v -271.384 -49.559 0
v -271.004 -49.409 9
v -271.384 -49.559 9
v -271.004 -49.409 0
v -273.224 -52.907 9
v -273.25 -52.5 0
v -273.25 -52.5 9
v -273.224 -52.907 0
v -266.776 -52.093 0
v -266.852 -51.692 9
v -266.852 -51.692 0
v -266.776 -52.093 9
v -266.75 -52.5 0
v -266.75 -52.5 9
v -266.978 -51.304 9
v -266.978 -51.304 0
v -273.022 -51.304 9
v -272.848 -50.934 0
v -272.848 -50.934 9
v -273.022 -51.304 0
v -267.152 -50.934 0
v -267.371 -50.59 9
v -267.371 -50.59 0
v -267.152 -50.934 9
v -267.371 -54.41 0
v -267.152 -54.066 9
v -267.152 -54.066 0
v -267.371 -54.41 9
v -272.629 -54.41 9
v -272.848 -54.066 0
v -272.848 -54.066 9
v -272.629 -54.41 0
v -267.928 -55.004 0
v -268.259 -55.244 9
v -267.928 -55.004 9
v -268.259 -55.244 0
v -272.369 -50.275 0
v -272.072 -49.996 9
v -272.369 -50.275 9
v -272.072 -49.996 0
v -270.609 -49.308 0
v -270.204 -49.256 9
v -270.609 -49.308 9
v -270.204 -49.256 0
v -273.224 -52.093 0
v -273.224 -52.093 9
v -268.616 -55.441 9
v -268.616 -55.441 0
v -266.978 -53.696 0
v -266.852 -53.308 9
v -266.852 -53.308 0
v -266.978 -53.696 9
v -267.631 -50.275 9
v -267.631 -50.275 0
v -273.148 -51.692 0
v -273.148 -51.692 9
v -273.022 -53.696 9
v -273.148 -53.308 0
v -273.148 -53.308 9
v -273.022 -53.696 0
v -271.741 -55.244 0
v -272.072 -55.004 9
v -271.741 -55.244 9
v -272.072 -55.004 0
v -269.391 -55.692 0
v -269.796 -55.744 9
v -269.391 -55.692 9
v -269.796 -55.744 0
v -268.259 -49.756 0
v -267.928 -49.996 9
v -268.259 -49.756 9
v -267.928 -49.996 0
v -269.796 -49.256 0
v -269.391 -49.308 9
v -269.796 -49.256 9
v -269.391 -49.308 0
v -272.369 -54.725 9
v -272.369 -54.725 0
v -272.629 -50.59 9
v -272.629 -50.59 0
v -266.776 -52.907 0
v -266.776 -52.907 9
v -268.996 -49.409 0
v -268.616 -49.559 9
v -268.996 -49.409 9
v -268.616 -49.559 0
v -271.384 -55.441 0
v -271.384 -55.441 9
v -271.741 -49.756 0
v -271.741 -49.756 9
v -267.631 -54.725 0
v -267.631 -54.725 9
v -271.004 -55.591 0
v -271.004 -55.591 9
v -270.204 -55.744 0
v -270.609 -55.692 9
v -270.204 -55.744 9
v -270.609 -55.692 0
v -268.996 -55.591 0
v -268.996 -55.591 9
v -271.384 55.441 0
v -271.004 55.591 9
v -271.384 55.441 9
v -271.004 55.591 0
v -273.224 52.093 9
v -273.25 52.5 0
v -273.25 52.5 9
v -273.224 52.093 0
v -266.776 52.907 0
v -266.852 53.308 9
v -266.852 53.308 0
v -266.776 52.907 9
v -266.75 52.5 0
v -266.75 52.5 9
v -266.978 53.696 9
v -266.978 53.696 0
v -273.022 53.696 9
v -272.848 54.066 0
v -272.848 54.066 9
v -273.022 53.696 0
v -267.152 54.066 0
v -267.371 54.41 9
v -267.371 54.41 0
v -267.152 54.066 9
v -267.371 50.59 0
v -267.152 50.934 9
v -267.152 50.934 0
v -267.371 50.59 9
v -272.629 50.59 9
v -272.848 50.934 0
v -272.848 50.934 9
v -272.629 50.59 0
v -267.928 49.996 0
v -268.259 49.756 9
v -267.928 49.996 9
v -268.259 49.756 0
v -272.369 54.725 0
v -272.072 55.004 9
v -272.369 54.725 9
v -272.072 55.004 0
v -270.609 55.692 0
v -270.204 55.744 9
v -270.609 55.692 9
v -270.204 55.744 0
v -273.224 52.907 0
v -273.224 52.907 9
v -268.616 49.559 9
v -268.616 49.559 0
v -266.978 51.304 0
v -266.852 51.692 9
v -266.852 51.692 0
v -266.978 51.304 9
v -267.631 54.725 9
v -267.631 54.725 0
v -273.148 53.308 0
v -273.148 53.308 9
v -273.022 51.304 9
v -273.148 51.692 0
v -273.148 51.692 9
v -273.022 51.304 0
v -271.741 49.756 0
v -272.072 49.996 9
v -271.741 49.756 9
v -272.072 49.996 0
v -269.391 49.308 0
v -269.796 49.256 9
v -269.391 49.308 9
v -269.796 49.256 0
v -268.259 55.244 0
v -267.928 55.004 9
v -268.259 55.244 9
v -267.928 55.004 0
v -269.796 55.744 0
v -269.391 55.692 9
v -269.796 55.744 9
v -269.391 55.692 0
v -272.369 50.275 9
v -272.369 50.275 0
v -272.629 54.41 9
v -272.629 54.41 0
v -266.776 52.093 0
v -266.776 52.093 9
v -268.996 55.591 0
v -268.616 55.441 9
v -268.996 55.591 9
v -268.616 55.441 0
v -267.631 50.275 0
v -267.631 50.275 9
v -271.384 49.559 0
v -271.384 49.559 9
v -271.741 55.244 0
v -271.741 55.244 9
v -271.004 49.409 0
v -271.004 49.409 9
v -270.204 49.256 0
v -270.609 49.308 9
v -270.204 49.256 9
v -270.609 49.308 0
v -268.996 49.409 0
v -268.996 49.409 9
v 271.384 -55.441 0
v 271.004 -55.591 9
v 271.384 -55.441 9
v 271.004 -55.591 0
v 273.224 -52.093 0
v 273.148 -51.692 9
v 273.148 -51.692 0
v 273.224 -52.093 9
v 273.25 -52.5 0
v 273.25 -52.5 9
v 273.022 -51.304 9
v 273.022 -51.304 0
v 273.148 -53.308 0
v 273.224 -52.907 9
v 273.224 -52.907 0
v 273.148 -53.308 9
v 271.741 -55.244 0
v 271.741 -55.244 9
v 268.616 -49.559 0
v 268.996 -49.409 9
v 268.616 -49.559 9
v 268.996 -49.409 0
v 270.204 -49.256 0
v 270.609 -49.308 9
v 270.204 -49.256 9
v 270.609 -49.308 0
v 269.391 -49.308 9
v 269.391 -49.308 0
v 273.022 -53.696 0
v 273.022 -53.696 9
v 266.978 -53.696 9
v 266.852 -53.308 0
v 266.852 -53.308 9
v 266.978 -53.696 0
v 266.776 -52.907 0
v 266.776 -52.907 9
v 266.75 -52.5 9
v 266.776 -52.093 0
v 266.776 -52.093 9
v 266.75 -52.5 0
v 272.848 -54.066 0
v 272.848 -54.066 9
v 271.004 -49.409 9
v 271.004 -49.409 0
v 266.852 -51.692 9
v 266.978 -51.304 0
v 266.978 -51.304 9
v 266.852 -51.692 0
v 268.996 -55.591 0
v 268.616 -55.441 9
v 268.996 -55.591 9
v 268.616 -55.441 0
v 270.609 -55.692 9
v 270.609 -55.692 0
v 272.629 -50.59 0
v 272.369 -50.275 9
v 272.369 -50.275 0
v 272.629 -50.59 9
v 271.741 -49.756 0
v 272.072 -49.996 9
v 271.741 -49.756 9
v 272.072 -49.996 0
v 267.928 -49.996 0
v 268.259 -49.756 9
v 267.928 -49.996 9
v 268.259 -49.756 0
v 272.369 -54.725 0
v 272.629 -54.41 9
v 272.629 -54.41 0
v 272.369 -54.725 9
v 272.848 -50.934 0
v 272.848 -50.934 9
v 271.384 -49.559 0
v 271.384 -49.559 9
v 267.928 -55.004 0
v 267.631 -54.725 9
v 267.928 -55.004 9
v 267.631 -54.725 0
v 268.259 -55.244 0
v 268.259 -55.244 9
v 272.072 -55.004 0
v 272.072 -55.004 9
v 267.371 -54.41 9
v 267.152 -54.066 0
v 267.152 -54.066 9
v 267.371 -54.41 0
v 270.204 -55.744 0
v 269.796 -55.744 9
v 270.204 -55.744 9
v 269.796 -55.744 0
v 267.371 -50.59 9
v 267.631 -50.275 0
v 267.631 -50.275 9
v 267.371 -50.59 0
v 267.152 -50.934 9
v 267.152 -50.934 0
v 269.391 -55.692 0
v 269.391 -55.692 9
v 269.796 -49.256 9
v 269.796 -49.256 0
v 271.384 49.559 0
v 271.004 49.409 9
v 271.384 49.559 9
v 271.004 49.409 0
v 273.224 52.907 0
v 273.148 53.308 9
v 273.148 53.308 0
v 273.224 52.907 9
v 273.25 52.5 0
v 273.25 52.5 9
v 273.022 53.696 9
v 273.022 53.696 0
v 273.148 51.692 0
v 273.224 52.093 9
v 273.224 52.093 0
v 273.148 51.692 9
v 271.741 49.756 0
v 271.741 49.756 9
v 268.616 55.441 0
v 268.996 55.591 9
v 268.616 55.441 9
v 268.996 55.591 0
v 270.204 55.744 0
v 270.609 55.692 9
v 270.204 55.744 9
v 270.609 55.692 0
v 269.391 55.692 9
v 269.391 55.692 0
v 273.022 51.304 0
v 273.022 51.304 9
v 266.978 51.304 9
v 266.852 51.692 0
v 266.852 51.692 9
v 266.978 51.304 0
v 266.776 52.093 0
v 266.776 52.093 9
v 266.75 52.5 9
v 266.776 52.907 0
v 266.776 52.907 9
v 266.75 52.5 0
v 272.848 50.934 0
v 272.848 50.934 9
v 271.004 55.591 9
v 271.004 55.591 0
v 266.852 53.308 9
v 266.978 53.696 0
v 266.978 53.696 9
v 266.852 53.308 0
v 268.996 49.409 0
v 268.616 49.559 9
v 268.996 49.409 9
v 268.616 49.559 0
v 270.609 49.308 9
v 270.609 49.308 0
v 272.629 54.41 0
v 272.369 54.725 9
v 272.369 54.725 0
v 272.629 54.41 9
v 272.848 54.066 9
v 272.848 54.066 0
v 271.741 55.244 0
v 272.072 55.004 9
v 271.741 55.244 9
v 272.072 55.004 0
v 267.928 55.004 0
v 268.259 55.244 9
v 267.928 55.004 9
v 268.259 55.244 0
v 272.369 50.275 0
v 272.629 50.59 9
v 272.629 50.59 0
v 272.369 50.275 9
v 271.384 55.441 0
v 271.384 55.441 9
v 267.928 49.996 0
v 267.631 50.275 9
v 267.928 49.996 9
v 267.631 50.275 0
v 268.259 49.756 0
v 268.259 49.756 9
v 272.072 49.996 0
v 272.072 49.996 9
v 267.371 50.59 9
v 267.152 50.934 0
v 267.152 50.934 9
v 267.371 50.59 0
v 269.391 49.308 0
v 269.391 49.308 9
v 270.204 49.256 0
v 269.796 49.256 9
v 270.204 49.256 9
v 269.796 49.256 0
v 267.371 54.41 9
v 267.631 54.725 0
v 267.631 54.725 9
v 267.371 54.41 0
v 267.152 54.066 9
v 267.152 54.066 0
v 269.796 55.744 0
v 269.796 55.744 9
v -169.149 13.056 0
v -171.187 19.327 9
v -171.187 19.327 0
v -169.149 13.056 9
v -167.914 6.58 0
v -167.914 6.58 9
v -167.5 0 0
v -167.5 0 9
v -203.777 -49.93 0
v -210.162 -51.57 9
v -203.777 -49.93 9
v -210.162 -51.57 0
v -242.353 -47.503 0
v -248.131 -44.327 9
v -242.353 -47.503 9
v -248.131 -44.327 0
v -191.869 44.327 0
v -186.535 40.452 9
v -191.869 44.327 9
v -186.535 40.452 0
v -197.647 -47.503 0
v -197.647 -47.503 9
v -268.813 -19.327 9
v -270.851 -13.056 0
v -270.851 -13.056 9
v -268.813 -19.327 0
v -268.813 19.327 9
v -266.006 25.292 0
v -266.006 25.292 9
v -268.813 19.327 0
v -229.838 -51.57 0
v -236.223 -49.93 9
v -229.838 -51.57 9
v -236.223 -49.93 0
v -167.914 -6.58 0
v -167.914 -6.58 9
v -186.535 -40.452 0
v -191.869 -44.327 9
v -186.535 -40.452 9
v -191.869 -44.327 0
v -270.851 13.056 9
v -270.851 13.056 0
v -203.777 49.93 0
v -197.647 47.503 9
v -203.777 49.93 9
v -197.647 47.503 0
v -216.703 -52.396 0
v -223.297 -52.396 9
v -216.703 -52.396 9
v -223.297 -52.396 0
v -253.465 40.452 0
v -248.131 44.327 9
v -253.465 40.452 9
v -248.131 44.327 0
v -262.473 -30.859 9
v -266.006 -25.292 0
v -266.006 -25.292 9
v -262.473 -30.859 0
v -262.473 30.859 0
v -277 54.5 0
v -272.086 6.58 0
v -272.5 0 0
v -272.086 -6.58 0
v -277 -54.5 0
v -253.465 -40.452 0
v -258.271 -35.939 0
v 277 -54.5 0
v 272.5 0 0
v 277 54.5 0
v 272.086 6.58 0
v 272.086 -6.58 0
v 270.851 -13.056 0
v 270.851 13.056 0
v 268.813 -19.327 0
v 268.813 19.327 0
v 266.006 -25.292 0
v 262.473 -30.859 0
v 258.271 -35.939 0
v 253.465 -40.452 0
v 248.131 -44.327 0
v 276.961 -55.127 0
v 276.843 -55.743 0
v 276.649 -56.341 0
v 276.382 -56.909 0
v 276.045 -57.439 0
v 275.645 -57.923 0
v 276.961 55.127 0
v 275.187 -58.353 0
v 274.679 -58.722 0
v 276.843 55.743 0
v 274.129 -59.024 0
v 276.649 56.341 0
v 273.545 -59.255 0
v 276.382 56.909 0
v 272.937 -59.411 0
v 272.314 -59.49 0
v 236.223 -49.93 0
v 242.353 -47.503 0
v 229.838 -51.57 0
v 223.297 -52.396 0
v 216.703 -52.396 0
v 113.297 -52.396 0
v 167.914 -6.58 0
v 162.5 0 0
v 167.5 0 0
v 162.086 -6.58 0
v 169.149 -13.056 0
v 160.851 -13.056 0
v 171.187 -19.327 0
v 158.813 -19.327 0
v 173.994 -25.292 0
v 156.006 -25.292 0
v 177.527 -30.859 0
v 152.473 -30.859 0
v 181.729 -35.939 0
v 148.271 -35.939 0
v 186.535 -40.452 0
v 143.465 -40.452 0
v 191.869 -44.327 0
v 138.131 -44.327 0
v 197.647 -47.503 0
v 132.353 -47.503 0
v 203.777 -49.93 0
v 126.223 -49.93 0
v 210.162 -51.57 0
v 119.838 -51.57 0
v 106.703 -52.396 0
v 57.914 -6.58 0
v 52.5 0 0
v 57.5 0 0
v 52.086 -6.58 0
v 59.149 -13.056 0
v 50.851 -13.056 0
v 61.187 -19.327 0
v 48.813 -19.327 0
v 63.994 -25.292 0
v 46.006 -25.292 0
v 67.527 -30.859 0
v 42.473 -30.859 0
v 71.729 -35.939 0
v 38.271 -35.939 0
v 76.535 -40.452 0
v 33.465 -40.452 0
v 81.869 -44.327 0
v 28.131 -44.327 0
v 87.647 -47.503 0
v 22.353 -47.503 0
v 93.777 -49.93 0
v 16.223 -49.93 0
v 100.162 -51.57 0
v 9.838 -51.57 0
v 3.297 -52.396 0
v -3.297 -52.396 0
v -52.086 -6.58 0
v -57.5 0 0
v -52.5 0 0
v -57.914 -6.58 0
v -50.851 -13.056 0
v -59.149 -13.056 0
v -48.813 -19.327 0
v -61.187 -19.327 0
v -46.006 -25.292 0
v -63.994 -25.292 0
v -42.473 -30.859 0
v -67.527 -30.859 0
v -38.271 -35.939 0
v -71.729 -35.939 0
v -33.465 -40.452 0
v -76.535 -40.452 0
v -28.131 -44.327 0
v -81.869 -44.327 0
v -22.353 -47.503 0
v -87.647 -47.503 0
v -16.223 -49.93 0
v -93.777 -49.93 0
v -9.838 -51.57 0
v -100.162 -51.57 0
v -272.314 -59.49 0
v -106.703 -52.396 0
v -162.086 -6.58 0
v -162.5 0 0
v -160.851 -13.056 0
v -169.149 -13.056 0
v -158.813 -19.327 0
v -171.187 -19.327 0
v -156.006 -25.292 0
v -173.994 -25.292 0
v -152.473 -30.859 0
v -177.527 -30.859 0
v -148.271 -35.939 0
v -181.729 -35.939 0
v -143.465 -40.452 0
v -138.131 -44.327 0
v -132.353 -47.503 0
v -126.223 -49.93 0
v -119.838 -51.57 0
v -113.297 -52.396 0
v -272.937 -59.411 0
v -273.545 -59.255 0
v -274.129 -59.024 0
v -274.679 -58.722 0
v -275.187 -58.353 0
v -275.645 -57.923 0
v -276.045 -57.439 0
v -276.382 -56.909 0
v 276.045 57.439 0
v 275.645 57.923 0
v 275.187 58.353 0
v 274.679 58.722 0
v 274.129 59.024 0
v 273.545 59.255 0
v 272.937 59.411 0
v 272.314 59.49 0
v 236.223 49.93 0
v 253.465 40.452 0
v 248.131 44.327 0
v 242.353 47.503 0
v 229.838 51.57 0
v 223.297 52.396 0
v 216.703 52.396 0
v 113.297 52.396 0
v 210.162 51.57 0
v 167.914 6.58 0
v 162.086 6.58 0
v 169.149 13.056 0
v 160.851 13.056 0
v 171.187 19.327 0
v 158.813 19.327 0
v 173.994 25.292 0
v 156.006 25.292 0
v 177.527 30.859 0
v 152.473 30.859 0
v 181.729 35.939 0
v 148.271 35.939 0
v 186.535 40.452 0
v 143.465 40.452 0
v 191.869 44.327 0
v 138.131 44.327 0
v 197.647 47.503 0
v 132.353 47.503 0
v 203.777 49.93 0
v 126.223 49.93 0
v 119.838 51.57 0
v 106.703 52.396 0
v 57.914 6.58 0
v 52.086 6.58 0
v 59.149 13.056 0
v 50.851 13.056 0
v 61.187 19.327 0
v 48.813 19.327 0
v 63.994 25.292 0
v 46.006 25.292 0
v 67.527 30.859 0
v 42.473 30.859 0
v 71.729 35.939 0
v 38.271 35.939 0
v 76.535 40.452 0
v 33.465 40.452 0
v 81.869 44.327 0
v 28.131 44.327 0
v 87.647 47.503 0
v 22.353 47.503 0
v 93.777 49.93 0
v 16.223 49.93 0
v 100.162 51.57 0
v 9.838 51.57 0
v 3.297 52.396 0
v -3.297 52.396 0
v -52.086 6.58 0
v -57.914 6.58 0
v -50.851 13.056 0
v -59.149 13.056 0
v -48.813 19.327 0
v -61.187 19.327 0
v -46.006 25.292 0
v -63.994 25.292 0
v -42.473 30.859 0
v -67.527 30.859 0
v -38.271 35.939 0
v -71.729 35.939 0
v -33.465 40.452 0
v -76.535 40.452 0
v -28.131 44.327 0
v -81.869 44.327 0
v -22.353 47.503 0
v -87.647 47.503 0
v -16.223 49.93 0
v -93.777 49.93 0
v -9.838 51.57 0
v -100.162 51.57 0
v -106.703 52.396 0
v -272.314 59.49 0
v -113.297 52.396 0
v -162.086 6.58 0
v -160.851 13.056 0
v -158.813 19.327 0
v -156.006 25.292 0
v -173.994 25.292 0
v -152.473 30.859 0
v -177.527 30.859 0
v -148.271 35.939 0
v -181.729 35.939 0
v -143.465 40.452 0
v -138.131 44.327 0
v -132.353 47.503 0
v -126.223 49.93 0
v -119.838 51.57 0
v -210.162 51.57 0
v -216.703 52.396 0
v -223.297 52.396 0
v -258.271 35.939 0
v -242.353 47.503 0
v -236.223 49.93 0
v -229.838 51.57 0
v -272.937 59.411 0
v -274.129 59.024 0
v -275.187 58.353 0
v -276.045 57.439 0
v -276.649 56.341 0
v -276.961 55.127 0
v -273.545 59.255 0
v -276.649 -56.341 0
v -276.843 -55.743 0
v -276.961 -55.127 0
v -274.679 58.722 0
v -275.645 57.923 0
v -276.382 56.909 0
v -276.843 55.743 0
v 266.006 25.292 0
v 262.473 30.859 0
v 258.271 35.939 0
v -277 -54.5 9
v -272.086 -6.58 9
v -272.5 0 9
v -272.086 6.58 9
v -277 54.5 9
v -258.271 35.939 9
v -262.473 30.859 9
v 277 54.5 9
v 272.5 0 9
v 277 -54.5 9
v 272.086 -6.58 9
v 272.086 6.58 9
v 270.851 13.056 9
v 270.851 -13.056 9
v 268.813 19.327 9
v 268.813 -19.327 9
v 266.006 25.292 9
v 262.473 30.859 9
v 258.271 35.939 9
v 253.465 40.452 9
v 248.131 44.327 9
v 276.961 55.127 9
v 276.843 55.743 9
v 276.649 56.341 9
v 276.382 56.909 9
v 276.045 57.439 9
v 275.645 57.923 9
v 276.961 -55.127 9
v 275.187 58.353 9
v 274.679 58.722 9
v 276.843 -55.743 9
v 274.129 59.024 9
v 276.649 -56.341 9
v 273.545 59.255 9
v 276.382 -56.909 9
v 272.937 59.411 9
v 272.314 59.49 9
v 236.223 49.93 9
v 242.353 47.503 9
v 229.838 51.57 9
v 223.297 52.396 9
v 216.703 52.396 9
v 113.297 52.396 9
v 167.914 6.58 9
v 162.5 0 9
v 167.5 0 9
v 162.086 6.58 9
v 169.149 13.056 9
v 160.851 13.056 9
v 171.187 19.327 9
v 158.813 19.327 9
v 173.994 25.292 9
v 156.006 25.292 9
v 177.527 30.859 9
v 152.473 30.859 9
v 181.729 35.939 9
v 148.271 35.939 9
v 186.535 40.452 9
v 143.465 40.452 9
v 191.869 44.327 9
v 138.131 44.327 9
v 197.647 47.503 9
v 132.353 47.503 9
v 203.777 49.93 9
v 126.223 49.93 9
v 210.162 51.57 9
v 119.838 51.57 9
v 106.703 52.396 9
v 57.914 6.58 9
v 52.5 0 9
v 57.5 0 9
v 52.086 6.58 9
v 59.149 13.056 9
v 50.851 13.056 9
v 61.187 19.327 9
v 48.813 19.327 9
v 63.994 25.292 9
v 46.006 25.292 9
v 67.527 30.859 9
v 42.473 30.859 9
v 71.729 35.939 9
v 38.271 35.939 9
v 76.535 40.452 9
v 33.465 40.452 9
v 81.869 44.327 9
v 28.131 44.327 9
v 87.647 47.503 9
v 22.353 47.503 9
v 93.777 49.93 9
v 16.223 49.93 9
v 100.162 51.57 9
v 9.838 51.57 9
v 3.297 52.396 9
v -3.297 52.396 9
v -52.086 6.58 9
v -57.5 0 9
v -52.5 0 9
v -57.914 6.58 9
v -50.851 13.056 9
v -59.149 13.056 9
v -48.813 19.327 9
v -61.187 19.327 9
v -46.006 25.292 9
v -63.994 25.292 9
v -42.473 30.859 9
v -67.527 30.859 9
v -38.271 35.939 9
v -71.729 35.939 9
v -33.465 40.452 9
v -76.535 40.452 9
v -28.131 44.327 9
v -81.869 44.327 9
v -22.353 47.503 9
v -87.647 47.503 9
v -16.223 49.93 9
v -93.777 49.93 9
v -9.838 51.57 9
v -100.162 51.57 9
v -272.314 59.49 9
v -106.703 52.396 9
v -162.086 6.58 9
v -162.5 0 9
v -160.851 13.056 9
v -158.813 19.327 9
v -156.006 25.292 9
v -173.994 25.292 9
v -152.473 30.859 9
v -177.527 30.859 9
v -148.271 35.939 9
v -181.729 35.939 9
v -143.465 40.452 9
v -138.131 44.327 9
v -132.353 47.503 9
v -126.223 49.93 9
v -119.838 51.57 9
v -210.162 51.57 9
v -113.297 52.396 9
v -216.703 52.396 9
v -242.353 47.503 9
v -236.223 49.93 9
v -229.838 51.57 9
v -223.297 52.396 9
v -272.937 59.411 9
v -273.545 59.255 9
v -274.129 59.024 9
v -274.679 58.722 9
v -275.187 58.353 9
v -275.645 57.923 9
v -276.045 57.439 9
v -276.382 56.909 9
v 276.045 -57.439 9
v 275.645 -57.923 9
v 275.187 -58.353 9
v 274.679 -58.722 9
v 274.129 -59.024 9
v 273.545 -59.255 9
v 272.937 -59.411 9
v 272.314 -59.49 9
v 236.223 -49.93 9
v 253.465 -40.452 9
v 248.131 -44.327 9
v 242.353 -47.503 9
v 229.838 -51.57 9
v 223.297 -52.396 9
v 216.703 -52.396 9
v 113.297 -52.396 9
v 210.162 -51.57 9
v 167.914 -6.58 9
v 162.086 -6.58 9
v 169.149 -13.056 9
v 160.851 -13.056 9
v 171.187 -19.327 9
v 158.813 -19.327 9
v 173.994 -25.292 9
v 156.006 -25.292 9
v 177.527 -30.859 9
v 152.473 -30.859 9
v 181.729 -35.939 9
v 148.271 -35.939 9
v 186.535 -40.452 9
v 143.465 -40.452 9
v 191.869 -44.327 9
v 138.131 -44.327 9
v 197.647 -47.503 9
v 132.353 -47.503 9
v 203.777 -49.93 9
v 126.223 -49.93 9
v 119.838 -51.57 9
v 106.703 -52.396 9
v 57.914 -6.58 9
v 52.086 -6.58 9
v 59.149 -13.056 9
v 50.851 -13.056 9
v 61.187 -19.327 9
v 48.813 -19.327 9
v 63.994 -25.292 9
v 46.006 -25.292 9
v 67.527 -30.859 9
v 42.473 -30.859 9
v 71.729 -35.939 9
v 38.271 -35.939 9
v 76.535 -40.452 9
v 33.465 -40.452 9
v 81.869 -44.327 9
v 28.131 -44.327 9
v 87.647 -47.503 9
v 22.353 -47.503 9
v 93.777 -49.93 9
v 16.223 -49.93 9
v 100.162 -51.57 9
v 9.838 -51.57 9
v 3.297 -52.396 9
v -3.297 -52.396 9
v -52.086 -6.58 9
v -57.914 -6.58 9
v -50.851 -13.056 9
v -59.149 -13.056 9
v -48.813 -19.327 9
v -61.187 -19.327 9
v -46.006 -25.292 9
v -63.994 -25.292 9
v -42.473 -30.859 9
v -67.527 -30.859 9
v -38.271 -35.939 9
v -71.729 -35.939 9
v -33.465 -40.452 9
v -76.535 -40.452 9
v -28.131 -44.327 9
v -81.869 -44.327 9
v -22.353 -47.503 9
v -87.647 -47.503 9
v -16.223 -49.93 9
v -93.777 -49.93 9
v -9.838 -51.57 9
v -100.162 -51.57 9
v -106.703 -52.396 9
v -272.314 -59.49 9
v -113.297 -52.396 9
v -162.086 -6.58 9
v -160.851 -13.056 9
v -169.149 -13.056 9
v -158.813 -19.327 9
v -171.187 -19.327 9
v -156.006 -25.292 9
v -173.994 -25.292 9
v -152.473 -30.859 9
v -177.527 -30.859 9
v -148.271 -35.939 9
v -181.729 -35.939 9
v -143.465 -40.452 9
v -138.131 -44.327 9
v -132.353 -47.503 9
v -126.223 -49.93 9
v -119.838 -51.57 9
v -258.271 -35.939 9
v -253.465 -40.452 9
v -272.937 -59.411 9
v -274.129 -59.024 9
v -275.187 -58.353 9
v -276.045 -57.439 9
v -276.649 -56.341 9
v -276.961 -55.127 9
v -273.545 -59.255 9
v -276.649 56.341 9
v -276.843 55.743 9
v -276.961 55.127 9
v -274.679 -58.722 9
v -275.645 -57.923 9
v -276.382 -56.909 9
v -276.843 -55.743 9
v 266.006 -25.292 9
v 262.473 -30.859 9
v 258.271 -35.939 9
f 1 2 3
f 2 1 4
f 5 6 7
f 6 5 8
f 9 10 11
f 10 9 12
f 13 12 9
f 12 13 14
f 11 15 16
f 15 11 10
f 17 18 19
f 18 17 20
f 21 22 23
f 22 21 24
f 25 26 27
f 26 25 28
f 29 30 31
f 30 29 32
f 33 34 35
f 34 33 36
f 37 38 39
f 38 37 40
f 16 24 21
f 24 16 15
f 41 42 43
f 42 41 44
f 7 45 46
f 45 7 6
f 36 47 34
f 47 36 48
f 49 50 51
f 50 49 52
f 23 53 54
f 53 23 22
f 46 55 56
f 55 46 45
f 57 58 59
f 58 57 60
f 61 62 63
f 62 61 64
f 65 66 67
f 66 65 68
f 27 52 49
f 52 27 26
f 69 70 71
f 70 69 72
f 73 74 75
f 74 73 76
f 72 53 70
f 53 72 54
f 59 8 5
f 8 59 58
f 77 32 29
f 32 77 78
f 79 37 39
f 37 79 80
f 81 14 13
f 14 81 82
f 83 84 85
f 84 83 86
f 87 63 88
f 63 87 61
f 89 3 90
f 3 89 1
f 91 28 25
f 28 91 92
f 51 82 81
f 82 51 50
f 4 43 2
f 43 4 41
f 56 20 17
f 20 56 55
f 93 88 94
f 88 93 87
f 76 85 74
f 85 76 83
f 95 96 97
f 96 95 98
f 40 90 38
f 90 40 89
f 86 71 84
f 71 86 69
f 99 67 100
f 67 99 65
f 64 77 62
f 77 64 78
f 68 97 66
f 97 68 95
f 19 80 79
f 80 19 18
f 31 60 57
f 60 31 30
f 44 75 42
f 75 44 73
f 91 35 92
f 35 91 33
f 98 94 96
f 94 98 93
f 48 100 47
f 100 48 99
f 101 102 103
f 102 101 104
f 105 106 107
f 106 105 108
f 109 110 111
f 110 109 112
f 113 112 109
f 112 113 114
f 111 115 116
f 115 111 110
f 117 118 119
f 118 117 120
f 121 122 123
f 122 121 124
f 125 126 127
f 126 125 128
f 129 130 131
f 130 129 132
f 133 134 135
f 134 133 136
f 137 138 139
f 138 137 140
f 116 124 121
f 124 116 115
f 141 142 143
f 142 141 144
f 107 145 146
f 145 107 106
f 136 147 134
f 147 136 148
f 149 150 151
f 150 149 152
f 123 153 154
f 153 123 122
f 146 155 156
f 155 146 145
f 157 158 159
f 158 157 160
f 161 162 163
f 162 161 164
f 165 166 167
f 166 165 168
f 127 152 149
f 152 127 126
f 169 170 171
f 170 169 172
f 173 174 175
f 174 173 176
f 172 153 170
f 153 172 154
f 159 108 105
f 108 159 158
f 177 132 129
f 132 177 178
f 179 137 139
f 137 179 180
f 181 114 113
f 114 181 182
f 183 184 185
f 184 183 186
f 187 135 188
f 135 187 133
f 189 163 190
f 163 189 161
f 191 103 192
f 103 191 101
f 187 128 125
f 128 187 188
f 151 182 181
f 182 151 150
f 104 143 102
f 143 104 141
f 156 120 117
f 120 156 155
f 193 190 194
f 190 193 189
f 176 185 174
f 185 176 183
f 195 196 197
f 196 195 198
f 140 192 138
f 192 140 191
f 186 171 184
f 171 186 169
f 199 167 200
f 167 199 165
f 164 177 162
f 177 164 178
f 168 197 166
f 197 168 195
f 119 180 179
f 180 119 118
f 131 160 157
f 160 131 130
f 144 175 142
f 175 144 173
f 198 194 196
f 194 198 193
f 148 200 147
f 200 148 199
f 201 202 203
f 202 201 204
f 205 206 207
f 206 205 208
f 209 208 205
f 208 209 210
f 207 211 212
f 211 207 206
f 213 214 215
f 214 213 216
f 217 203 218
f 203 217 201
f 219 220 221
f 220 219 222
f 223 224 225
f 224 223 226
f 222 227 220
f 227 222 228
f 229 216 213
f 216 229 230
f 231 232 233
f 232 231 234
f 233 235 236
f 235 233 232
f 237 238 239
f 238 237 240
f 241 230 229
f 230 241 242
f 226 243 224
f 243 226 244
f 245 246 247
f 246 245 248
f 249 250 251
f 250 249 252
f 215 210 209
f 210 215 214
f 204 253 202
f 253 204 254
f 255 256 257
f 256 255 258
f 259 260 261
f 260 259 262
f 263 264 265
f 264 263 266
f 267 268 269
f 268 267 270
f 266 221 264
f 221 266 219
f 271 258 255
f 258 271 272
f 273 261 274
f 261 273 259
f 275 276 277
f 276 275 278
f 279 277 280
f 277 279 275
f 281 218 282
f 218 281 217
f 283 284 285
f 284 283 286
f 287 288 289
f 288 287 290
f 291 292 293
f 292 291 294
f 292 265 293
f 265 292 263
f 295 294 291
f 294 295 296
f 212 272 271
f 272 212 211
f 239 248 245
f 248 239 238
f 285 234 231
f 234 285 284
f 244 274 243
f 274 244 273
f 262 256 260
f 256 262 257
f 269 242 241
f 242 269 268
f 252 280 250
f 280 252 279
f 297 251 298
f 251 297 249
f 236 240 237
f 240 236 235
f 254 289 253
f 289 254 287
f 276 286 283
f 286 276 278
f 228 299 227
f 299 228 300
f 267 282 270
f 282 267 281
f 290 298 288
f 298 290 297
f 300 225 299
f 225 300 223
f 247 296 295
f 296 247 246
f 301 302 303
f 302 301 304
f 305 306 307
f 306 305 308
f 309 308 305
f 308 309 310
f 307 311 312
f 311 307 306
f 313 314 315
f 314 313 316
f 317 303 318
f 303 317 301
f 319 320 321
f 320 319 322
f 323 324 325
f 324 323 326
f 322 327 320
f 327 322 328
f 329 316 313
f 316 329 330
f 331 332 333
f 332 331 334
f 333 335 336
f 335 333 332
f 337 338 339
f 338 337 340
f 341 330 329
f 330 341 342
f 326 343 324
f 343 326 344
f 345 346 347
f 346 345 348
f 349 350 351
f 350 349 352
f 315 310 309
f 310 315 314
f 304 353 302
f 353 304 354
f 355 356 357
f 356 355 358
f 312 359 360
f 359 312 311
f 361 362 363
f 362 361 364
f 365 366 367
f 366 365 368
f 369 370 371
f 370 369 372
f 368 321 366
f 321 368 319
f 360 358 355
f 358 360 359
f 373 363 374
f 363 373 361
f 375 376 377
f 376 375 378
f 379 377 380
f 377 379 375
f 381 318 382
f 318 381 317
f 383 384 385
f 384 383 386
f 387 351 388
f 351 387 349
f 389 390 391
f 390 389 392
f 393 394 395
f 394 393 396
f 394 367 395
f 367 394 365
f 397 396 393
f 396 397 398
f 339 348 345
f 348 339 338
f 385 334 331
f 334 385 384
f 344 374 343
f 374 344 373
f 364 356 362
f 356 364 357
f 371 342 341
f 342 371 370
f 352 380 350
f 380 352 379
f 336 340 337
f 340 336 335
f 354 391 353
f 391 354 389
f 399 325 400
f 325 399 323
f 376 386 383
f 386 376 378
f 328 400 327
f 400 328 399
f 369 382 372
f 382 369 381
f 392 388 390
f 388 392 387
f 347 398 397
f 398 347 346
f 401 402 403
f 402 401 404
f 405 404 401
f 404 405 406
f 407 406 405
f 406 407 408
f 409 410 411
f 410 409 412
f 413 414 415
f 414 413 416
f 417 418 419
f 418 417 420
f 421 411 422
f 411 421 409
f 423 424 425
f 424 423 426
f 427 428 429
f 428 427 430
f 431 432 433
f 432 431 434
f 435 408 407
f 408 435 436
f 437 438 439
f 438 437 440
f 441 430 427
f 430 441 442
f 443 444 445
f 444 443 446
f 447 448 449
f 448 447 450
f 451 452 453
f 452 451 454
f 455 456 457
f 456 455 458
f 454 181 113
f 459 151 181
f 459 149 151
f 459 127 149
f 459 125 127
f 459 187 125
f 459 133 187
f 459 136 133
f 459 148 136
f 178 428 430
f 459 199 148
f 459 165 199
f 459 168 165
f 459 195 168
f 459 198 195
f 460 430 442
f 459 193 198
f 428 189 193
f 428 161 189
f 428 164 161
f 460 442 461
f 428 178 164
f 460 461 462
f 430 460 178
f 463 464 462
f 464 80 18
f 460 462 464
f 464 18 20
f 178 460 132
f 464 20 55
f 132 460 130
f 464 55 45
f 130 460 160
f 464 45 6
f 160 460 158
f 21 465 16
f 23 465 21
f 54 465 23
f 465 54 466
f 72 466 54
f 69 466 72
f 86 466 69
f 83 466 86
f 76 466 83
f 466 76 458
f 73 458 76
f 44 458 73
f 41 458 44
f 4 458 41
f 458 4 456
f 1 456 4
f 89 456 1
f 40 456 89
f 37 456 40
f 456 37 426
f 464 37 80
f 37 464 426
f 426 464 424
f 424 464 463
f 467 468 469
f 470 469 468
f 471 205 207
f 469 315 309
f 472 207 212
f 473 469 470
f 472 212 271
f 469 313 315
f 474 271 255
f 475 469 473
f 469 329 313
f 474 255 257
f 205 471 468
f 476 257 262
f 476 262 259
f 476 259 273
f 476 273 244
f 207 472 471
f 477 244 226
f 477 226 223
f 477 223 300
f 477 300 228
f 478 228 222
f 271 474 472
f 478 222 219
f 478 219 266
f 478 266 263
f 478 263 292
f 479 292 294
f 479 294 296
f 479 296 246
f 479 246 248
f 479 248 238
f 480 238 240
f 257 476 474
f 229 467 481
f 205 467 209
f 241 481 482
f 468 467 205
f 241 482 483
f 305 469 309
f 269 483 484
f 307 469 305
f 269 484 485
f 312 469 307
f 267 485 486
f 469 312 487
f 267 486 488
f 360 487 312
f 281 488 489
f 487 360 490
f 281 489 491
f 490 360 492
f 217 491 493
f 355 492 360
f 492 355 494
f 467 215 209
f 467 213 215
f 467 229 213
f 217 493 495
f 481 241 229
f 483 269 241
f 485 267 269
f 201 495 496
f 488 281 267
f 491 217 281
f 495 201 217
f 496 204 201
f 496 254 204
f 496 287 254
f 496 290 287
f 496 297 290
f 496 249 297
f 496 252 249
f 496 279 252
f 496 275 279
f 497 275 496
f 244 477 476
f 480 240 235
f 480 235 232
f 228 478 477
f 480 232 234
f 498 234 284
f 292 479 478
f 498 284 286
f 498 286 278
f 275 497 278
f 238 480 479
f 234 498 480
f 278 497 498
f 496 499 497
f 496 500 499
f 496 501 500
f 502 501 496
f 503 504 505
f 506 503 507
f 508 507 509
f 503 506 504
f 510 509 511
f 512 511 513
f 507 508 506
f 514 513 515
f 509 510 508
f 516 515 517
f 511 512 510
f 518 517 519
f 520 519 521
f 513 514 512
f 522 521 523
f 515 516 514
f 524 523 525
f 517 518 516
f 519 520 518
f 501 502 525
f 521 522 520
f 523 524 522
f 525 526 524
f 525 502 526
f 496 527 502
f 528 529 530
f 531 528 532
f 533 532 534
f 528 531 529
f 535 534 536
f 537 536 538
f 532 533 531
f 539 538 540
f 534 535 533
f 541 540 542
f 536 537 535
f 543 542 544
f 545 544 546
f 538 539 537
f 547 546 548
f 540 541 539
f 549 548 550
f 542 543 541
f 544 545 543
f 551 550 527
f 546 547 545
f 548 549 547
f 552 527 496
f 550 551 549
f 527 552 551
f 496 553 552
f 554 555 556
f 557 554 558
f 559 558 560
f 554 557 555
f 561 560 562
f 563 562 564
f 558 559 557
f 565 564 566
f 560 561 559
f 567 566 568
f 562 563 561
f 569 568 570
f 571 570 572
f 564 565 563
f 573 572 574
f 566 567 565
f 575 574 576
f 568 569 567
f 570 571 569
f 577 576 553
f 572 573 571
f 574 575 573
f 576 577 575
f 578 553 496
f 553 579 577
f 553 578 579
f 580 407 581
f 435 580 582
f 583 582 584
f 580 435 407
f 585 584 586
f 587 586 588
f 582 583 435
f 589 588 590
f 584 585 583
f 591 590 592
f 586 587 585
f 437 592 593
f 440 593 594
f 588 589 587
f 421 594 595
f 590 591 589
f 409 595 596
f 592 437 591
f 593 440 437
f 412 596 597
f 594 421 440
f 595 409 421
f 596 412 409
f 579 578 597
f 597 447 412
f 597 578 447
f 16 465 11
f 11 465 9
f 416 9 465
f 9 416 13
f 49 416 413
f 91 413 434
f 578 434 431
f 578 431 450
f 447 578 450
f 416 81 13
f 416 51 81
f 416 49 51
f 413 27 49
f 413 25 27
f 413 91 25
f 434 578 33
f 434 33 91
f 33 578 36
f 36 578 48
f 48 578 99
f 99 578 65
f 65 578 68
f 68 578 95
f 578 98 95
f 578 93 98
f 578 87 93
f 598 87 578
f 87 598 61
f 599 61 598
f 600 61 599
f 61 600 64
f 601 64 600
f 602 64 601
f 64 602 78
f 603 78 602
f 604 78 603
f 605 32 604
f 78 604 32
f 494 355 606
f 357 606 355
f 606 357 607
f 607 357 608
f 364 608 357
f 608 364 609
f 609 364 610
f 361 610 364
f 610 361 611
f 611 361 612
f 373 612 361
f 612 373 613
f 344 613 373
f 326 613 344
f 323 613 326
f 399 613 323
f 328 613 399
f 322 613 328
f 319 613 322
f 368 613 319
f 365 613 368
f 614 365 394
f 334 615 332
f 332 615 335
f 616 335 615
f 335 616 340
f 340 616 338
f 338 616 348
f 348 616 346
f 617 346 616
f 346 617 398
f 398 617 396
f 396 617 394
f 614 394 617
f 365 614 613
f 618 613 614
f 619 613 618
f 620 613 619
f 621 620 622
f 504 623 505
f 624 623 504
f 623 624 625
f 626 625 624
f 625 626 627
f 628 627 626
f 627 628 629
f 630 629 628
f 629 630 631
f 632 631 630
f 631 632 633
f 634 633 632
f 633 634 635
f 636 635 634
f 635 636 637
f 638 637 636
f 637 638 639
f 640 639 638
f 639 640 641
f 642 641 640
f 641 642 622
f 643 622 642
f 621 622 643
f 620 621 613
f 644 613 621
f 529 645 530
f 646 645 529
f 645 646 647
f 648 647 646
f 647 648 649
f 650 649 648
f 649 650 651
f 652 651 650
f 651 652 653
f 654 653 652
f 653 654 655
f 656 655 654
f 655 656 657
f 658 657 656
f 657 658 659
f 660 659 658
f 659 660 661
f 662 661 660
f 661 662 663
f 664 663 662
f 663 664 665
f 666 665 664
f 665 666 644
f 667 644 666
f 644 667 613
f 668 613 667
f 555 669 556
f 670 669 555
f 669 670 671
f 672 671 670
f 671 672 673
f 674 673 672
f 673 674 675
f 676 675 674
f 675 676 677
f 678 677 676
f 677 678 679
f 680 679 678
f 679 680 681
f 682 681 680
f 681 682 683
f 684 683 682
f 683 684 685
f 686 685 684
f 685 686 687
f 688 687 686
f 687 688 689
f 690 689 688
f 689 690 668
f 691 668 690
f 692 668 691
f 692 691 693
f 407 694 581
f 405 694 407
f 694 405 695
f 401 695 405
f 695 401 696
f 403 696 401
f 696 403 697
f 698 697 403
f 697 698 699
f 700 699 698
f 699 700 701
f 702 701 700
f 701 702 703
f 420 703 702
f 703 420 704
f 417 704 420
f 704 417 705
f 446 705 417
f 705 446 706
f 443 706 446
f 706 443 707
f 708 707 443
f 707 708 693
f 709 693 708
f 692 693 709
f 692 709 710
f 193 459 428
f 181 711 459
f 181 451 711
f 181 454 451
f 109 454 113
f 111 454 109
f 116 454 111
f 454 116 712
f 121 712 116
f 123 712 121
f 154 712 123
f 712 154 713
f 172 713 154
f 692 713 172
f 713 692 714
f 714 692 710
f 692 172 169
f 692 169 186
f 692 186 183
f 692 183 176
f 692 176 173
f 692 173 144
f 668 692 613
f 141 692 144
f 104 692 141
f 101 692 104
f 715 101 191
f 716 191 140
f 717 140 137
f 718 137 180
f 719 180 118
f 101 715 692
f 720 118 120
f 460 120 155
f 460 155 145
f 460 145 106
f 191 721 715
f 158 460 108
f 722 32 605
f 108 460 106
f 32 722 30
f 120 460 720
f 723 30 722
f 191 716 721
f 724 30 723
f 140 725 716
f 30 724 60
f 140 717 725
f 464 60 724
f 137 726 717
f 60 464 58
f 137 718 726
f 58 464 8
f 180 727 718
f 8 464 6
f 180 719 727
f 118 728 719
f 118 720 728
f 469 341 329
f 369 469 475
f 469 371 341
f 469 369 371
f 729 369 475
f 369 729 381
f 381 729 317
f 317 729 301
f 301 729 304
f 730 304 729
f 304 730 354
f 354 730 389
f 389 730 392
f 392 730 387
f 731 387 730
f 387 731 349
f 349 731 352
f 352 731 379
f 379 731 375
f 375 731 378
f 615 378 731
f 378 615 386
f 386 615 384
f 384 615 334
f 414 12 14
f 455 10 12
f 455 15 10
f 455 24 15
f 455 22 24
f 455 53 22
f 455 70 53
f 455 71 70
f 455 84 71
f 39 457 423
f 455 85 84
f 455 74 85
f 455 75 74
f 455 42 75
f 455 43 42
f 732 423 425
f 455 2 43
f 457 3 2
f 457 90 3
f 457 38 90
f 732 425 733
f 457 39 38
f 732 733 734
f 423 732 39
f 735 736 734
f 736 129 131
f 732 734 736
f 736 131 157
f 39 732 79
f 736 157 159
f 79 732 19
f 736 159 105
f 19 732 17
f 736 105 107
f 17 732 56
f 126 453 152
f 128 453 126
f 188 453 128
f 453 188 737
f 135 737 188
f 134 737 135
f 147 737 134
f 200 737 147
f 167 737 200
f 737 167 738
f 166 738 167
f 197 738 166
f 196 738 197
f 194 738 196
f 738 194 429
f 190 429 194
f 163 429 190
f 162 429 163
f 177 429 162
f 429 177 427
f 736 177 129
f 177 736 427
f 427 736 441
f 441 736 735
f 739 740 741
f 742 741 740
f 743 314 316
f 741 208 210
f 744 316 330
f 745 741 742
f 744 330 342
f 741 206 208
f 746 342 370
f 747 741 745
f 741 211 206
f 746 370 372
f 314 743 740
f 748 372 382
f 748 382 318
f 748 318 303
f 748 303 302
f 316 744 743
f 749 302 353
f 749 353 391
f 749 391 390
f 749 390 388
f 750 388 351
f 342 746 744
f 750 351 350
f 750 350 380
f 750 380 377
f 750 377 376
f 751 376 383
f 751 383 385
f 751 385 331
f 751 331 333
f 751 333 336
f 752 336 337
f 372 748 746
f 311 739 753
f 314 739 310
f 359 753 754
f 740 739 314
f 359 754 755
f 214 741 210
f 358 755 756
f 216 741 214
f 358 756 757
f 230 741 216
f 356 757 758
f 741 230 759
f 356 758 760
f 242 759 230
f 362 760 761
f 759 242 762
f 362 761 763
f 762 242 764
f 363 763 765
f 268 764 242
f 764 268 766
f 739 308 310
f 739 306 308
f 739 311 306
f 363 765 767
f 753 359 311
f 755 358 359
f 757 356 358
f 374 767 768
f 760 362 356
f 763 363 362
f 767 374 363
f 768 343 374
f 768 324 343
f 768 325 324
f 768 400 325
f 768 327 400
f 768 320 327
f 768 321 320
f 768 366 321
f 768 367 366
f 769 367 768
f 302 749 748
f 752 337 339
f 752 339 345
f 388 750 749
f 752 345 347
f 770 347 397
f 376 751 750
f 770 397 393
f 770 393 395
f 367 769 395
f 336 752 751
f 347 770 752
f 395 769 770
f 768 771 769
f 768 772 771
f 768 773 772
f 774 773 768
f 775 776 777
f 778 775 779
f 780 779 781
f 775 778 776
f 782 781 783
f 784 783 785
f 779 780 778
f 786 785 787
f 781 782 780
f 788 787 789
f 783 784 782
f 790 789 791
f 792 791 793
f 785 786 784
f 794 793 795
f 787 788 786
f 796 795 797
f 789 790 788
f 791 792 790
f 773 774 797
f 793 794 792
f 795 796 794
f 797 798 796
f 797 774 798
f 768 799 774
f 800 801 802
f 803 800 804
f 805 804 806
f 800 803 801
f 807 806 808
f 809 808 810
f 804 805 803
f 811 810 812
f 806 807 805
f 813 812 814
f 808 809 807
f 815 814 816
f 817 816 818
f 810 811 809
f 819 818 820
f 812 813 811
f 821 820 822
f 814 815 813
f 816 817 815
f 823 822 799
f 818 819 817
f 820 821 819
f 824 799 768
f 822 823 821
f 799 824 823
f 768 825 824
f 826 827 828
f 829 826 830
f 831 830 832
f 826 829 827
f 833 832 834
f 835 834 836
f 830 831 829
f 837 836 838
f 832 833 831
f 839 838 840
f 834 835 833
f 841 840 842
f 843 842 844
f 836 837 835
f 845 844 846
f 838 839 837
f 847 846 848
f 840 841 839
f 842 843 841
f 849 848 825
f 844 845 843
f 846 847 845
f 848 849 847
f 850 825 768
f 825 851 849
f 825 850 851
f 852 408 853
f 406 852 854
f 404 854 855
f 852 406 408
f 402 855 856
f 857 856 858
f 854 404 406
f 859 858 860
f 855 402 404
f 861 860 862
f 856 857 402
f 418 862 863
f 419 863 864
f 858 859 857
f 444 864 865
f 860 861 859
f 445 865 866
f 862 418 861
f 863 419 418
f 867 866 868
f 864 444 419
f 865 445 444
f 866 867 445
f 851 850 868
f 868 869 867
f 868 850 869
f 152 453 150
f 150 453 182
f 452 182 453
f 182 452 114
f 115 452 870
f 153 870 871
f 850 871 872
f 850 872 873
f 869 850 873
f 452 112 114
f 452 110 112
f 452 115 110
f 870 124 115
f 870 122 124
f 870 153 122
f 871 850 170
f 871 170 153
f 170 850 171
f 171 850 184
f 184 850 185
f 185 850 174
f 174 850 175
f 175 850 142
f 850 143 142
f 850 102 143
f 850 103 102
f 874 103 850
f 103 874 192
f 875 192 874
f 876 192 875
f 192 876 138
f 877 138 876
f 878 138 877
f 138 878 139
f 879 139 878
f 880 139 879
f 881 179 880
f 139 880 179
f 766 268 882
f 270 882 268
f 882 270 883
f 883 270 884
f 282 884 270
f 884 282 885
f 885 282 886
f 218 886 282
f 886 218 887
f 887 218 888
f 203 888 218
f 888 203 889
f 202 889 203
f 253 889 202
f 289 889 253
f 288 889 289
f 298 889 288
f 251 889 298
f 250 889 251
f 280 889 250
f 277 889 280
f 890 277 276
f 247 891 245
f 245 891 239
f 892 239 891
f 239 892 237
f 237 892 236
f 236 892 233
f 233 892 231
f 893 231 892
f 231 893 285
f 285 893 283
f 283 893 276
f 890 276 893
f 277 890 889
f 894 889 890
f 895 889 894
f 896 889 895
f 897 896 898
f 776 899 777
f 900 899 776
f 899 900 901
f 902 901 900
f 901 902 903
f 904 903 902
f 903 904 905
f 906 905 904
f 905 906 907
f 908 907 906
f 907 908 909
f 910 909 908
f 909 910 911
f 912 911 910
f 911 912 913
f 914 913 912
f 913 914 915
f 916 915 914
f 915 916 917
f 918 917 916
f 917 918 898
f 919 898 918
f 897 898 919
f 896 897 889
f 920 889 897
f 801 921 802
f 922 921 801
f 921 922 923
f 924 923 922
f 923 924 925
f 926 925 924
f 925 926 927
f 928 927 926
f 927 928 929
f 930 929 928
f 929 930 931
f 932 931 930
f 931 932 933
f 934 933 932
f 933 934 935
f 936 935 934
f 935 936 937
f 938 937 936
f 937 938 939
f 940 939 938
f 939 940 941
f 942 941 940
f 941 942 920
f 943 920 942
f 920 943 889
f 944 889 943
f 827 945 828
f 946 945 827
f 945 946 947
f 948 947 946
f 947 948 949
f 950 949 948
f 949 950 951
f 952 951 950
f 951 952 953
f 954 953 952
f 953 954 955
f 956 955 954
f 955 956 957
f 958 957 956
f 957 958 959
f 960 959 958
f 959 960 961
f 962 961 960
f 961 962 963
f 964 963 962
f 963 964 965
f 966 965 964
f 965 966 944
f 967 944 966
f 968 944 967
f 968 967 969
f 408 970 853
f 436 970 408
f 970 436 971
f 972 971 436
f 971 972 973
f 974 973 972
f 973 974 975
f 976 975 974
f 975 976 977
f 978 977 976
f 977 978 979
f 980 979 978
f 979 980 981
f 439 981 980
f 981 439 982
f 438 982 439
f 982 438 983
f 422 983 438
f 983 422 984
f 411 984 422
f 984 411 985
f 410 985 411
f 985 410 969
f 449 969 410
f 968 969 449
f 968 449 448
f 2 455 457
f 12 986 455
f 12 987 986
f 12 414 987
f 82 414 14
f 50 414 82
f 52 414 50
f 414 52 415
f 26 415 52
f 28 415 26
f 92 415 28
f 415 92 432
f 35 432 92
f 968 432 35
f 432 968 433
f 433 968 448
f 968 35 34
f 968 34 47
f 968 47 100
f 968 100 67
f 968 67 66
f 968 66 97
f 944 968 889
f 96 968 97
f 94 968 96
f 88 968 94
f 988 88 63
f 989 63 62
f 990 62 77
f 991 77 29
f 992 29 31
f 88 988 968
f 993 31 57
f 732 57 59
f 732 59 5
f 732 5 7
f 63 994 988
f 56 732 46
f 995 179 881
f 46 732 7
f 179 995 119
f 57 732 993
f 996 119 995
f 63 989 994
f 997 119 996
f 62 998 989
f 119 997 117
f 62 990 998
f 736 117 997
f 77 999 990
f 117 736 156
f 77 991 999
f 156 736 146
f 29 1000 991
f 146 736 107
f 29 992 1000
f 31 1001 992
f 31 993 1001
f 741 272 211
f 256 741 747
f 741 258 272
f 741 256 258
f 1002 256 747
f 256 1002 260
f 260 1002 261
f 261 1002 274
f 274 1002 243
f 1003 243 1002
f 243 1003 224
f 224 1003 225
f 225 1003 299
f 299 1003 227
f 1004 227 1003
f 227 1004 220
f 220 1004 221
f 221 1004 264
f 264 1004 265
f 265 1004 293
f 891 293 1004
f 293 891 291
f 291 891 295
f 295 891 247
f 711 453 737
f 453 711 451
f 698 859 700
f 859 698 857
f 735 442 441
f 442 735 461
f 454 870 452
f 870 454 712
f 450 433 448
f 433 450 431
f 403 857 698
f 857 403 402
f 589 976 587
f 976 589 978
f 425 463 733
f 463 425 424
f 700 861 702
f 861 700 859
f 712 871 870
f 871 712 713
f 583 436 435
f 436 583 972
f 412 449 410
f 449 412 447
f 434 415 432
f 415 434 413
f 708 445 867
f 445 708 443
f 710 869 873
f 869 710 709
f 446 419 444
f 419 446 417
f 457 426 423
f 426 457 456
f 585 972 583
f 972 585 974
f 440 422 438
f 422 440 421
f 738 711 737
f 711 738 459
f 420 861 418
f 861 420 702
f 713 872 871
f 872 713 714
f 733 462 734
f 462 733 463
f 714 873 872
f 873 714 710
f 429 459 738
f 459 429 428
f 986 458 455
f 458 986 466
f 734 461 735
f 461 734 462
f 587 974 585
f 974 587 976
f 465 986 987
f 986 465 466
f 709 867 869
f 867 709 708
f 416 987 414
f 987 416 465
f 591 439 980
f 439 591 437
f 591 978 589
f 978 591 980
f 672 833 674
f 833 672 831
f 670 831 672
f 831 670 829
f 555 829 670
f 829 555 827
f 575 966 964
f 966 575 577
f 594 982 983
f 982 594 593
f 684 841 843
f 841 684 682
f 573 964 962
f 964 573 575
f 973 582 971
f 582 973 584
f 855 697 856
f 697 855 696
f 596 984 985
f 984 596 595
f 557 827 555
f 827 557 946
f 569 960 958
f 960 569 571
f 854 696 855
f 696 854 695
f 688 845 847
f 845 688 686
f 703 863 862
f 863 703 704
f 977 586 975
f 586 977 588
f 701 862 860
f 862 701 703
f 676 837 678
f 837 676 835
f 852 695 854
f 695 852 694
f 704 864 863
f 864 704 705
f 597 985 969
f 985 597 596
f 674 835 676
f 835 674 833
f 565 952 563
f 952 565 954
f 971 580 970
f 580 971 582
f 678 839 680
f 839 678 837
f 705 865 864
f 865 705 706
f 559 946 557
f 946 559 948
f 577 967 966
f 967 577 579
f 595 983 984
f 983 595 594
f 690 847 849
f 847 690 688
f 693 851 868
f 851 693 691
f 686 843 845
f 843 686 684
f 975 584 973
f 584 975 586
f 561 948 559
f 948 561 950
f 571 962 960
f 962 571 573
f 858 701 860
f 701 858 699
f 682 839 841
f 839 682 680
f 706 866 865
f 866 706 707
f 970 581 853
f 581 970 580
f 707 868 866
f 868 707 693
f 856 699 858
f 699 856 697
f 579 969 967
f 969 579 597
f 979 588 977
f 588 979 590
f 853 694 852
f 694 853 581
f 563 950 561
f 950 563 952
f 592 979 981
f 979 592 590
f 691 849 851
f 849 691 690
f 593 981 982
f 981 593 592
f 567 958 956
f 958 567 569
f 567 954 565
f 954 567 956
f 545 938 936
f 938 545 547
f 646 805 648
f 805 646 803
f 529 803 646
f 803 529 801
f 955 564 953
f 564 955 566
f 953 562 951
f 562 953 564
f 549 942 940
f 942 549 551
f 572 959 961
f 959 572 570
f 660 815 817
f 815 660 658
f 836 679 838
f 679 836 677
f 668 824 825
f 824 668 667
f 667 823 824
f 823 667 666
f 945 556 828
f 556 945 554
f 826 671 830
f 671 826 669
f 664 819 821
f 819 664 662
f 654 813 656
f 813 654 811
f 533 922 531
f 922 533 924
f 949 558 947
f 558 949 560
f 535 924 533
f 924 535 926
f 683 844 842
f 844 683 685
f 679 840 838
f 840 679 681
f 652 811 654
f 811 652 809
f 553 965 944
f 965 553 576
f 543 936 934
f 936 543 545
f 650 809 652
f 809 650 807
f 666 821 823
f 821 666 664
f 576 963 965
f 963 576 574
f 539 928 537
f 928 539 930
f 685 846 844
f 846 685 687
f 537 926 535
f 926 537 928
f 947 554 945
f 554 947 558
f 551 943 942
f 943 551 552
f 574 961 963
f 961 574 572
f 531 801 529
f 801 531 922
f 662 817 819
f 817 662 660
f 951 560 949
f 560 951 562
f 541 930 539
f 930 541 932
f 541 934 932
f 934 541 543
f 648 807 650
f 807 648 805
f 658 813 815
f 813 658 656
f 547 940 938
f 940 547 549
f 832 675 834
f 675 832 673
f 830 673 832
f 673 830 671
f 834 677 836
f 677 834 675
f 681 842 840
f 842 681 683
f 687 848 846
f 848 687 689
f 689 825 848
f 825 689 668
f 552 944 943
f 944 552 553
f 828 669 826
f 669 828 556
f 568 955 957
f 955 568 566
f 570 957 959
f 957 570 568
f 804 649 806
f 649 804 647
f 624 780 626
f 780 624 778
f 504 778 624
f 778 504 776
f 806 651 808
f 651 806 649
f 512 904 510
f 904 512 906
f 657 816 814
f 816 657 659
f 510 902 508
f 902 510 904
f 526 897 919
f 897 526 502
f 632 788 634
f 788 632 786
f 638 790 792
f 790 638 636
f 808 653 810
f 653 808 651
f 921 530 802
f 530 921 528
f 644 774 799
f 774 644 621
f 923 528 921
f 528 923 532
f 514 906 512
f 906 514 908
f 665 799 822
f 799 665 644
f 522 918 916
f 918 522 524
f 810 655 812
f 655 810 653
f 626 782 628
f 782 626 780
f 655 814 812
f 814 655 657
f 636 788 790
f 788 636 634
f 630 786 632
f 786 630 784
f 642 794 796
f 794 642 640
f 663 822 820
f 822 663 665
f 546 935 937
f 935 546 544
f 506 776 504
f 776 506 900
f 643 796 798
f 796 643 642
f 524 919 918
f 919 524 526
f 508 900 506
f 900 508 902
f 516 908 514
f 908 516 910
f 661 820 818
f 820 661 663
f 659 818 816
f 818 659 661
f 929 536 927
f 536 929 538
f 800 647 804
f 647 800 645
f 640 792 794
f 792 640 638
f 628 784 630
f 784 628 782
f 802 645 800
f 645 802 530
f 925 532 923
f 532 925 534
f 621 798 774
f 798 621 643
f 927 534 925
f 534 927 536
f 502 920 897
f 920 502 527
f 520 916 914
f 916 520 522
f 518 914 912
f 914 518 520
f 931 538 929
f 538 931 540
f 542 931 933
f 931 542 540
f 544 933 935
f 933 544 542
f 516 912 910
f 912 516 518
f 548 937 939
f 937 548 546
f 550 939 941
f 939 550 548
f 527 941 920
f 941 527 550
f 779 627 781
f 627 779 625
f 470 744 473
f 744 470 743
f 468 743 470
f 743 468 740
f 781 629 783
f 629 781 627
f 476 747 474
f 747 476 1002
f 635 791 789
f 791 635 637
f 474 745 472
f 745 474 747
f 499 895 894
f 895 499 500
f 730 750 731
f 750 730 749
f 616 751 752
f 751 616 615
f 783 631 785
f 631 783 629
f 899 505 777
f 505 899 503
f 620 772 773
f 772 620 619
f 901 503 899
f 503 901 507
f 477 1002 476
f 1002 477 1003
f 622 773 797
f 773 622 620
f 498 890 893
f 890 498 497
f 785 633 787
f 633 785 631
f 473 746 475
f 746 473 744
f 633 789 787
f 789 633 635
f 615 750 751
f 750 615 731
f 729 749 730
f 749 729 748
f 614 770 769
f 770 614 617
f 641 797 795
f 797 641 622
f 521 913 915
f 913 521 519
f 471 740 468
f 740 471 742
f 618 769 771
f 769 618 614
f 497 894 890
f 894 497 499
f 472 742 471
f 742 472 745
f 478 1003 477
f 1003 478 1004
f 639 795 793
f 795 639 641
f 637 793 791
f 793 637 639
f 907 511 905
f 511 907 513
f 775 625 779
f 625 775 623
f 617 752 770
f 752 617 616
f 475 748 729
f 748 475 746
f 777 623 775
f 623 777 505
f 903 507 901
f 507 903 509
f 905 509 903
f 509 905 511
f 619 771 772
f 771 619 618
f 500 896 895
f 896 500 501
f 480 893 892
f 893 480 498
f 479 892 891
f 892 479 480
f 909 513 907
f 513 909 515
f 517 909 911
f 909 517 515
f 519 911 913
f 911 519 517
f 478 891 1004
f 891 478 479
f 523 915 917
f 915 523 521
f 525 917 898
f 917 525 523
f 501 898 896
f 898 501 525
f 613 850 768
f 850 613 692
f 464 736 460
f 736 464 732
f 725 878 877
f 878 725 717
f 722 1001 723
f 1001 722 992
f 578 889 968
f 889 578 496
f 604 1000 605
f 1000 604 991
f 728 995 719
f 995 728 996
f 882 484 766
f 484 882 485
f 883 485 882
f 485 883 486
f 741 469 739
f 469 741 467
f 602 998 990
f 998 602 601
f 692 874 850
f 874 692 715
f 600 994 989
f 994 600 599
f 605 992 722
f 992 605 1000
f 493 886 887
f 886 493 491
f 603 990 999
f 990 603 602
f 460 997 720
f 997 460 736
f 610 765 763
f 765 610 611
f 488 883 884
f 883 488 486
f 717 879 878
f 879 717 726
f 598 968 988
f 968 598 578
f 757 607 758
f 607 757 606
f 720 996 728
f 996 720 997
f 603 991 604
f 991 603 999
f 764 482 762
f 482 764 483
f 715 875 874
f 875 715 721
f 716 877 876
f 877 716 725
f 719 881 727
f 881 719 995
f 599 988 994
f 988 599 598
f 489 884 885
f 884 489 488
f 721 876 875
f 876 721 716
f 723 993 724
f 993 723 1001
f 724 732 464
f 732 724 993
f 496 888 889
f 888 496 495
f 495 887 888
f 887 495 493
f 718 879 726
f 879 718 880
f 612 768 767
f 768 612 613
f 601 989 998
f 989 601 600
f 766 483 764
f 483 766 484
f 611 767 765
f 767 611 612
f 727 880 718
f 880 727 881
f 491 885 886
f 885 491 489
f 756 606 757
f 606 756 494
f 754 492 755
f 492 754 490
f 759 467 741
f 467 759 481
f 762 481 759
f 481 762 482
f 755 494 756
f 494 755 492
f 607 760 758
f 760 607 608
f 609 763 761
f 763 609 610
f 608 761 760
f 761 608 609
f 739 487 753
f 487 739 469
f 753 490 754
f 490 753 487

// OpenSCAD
$fn = 50;


difference() {
	union() {
		hull() {
			translate(v = [-272.0000000000, 54.5000000000, 0]) {
				cylinder(h = 9, r = 5);
			}
			translate(v = [272.0000000000, 54.5000000000, 0]) {
				cylinder(h = 9, r = 5);
			}
			translate(v = [-272.0000000000, -54.5000000000, 0]) {
				cylinder(h = 9, r = 5);
			}
			translate(v = [272.0000000000, -54.5000000000, 0]) {
				cylinder(h = 9, r = 5);
			}
		}
	}
	union() {
		#translate(v = [-270.0000000000, -52.5000000000, -100.0000000000]) {
			cylinder(h = 200, r = 3.2500000000);
		}
		#translate(v = [-270.0000000000, 52.5000000000, -100.0000000000]) {
			cylinder(h = 200, r = 3.2500000000);
		}
		#translate(v = [270.0000000000, -52.5000000000, -100.0000000000]) {
			cylinder(h = 200, r = 3.2500000000);
		}
		#translate(v = [270.0000000000, 52.5000000000, -100.0000000000]) {
			cylinder(h = 200, r = 3.2500000000);
		}
		#translate(v = [-220.0000000000, 0, 0]) {
			cylinder(h = 9, r = 52.5000000000);
		}
		#translate(v = [-110.0000000000, 0, 0]) {
			cylinder(h = 9, r = 52.5000000000);
		}
		#cylinder(h = 9, r = 52.5000000000);
		#translate(v = [110.0000000000, 0, 0]) {
			cylinder(h = 9, r = 52.5000000000);
		}
		#translate(v = [220.0000000000, 0, 0]) {
			cylinder(h = 9, r = 52.5000000000);
		}
	}
}
